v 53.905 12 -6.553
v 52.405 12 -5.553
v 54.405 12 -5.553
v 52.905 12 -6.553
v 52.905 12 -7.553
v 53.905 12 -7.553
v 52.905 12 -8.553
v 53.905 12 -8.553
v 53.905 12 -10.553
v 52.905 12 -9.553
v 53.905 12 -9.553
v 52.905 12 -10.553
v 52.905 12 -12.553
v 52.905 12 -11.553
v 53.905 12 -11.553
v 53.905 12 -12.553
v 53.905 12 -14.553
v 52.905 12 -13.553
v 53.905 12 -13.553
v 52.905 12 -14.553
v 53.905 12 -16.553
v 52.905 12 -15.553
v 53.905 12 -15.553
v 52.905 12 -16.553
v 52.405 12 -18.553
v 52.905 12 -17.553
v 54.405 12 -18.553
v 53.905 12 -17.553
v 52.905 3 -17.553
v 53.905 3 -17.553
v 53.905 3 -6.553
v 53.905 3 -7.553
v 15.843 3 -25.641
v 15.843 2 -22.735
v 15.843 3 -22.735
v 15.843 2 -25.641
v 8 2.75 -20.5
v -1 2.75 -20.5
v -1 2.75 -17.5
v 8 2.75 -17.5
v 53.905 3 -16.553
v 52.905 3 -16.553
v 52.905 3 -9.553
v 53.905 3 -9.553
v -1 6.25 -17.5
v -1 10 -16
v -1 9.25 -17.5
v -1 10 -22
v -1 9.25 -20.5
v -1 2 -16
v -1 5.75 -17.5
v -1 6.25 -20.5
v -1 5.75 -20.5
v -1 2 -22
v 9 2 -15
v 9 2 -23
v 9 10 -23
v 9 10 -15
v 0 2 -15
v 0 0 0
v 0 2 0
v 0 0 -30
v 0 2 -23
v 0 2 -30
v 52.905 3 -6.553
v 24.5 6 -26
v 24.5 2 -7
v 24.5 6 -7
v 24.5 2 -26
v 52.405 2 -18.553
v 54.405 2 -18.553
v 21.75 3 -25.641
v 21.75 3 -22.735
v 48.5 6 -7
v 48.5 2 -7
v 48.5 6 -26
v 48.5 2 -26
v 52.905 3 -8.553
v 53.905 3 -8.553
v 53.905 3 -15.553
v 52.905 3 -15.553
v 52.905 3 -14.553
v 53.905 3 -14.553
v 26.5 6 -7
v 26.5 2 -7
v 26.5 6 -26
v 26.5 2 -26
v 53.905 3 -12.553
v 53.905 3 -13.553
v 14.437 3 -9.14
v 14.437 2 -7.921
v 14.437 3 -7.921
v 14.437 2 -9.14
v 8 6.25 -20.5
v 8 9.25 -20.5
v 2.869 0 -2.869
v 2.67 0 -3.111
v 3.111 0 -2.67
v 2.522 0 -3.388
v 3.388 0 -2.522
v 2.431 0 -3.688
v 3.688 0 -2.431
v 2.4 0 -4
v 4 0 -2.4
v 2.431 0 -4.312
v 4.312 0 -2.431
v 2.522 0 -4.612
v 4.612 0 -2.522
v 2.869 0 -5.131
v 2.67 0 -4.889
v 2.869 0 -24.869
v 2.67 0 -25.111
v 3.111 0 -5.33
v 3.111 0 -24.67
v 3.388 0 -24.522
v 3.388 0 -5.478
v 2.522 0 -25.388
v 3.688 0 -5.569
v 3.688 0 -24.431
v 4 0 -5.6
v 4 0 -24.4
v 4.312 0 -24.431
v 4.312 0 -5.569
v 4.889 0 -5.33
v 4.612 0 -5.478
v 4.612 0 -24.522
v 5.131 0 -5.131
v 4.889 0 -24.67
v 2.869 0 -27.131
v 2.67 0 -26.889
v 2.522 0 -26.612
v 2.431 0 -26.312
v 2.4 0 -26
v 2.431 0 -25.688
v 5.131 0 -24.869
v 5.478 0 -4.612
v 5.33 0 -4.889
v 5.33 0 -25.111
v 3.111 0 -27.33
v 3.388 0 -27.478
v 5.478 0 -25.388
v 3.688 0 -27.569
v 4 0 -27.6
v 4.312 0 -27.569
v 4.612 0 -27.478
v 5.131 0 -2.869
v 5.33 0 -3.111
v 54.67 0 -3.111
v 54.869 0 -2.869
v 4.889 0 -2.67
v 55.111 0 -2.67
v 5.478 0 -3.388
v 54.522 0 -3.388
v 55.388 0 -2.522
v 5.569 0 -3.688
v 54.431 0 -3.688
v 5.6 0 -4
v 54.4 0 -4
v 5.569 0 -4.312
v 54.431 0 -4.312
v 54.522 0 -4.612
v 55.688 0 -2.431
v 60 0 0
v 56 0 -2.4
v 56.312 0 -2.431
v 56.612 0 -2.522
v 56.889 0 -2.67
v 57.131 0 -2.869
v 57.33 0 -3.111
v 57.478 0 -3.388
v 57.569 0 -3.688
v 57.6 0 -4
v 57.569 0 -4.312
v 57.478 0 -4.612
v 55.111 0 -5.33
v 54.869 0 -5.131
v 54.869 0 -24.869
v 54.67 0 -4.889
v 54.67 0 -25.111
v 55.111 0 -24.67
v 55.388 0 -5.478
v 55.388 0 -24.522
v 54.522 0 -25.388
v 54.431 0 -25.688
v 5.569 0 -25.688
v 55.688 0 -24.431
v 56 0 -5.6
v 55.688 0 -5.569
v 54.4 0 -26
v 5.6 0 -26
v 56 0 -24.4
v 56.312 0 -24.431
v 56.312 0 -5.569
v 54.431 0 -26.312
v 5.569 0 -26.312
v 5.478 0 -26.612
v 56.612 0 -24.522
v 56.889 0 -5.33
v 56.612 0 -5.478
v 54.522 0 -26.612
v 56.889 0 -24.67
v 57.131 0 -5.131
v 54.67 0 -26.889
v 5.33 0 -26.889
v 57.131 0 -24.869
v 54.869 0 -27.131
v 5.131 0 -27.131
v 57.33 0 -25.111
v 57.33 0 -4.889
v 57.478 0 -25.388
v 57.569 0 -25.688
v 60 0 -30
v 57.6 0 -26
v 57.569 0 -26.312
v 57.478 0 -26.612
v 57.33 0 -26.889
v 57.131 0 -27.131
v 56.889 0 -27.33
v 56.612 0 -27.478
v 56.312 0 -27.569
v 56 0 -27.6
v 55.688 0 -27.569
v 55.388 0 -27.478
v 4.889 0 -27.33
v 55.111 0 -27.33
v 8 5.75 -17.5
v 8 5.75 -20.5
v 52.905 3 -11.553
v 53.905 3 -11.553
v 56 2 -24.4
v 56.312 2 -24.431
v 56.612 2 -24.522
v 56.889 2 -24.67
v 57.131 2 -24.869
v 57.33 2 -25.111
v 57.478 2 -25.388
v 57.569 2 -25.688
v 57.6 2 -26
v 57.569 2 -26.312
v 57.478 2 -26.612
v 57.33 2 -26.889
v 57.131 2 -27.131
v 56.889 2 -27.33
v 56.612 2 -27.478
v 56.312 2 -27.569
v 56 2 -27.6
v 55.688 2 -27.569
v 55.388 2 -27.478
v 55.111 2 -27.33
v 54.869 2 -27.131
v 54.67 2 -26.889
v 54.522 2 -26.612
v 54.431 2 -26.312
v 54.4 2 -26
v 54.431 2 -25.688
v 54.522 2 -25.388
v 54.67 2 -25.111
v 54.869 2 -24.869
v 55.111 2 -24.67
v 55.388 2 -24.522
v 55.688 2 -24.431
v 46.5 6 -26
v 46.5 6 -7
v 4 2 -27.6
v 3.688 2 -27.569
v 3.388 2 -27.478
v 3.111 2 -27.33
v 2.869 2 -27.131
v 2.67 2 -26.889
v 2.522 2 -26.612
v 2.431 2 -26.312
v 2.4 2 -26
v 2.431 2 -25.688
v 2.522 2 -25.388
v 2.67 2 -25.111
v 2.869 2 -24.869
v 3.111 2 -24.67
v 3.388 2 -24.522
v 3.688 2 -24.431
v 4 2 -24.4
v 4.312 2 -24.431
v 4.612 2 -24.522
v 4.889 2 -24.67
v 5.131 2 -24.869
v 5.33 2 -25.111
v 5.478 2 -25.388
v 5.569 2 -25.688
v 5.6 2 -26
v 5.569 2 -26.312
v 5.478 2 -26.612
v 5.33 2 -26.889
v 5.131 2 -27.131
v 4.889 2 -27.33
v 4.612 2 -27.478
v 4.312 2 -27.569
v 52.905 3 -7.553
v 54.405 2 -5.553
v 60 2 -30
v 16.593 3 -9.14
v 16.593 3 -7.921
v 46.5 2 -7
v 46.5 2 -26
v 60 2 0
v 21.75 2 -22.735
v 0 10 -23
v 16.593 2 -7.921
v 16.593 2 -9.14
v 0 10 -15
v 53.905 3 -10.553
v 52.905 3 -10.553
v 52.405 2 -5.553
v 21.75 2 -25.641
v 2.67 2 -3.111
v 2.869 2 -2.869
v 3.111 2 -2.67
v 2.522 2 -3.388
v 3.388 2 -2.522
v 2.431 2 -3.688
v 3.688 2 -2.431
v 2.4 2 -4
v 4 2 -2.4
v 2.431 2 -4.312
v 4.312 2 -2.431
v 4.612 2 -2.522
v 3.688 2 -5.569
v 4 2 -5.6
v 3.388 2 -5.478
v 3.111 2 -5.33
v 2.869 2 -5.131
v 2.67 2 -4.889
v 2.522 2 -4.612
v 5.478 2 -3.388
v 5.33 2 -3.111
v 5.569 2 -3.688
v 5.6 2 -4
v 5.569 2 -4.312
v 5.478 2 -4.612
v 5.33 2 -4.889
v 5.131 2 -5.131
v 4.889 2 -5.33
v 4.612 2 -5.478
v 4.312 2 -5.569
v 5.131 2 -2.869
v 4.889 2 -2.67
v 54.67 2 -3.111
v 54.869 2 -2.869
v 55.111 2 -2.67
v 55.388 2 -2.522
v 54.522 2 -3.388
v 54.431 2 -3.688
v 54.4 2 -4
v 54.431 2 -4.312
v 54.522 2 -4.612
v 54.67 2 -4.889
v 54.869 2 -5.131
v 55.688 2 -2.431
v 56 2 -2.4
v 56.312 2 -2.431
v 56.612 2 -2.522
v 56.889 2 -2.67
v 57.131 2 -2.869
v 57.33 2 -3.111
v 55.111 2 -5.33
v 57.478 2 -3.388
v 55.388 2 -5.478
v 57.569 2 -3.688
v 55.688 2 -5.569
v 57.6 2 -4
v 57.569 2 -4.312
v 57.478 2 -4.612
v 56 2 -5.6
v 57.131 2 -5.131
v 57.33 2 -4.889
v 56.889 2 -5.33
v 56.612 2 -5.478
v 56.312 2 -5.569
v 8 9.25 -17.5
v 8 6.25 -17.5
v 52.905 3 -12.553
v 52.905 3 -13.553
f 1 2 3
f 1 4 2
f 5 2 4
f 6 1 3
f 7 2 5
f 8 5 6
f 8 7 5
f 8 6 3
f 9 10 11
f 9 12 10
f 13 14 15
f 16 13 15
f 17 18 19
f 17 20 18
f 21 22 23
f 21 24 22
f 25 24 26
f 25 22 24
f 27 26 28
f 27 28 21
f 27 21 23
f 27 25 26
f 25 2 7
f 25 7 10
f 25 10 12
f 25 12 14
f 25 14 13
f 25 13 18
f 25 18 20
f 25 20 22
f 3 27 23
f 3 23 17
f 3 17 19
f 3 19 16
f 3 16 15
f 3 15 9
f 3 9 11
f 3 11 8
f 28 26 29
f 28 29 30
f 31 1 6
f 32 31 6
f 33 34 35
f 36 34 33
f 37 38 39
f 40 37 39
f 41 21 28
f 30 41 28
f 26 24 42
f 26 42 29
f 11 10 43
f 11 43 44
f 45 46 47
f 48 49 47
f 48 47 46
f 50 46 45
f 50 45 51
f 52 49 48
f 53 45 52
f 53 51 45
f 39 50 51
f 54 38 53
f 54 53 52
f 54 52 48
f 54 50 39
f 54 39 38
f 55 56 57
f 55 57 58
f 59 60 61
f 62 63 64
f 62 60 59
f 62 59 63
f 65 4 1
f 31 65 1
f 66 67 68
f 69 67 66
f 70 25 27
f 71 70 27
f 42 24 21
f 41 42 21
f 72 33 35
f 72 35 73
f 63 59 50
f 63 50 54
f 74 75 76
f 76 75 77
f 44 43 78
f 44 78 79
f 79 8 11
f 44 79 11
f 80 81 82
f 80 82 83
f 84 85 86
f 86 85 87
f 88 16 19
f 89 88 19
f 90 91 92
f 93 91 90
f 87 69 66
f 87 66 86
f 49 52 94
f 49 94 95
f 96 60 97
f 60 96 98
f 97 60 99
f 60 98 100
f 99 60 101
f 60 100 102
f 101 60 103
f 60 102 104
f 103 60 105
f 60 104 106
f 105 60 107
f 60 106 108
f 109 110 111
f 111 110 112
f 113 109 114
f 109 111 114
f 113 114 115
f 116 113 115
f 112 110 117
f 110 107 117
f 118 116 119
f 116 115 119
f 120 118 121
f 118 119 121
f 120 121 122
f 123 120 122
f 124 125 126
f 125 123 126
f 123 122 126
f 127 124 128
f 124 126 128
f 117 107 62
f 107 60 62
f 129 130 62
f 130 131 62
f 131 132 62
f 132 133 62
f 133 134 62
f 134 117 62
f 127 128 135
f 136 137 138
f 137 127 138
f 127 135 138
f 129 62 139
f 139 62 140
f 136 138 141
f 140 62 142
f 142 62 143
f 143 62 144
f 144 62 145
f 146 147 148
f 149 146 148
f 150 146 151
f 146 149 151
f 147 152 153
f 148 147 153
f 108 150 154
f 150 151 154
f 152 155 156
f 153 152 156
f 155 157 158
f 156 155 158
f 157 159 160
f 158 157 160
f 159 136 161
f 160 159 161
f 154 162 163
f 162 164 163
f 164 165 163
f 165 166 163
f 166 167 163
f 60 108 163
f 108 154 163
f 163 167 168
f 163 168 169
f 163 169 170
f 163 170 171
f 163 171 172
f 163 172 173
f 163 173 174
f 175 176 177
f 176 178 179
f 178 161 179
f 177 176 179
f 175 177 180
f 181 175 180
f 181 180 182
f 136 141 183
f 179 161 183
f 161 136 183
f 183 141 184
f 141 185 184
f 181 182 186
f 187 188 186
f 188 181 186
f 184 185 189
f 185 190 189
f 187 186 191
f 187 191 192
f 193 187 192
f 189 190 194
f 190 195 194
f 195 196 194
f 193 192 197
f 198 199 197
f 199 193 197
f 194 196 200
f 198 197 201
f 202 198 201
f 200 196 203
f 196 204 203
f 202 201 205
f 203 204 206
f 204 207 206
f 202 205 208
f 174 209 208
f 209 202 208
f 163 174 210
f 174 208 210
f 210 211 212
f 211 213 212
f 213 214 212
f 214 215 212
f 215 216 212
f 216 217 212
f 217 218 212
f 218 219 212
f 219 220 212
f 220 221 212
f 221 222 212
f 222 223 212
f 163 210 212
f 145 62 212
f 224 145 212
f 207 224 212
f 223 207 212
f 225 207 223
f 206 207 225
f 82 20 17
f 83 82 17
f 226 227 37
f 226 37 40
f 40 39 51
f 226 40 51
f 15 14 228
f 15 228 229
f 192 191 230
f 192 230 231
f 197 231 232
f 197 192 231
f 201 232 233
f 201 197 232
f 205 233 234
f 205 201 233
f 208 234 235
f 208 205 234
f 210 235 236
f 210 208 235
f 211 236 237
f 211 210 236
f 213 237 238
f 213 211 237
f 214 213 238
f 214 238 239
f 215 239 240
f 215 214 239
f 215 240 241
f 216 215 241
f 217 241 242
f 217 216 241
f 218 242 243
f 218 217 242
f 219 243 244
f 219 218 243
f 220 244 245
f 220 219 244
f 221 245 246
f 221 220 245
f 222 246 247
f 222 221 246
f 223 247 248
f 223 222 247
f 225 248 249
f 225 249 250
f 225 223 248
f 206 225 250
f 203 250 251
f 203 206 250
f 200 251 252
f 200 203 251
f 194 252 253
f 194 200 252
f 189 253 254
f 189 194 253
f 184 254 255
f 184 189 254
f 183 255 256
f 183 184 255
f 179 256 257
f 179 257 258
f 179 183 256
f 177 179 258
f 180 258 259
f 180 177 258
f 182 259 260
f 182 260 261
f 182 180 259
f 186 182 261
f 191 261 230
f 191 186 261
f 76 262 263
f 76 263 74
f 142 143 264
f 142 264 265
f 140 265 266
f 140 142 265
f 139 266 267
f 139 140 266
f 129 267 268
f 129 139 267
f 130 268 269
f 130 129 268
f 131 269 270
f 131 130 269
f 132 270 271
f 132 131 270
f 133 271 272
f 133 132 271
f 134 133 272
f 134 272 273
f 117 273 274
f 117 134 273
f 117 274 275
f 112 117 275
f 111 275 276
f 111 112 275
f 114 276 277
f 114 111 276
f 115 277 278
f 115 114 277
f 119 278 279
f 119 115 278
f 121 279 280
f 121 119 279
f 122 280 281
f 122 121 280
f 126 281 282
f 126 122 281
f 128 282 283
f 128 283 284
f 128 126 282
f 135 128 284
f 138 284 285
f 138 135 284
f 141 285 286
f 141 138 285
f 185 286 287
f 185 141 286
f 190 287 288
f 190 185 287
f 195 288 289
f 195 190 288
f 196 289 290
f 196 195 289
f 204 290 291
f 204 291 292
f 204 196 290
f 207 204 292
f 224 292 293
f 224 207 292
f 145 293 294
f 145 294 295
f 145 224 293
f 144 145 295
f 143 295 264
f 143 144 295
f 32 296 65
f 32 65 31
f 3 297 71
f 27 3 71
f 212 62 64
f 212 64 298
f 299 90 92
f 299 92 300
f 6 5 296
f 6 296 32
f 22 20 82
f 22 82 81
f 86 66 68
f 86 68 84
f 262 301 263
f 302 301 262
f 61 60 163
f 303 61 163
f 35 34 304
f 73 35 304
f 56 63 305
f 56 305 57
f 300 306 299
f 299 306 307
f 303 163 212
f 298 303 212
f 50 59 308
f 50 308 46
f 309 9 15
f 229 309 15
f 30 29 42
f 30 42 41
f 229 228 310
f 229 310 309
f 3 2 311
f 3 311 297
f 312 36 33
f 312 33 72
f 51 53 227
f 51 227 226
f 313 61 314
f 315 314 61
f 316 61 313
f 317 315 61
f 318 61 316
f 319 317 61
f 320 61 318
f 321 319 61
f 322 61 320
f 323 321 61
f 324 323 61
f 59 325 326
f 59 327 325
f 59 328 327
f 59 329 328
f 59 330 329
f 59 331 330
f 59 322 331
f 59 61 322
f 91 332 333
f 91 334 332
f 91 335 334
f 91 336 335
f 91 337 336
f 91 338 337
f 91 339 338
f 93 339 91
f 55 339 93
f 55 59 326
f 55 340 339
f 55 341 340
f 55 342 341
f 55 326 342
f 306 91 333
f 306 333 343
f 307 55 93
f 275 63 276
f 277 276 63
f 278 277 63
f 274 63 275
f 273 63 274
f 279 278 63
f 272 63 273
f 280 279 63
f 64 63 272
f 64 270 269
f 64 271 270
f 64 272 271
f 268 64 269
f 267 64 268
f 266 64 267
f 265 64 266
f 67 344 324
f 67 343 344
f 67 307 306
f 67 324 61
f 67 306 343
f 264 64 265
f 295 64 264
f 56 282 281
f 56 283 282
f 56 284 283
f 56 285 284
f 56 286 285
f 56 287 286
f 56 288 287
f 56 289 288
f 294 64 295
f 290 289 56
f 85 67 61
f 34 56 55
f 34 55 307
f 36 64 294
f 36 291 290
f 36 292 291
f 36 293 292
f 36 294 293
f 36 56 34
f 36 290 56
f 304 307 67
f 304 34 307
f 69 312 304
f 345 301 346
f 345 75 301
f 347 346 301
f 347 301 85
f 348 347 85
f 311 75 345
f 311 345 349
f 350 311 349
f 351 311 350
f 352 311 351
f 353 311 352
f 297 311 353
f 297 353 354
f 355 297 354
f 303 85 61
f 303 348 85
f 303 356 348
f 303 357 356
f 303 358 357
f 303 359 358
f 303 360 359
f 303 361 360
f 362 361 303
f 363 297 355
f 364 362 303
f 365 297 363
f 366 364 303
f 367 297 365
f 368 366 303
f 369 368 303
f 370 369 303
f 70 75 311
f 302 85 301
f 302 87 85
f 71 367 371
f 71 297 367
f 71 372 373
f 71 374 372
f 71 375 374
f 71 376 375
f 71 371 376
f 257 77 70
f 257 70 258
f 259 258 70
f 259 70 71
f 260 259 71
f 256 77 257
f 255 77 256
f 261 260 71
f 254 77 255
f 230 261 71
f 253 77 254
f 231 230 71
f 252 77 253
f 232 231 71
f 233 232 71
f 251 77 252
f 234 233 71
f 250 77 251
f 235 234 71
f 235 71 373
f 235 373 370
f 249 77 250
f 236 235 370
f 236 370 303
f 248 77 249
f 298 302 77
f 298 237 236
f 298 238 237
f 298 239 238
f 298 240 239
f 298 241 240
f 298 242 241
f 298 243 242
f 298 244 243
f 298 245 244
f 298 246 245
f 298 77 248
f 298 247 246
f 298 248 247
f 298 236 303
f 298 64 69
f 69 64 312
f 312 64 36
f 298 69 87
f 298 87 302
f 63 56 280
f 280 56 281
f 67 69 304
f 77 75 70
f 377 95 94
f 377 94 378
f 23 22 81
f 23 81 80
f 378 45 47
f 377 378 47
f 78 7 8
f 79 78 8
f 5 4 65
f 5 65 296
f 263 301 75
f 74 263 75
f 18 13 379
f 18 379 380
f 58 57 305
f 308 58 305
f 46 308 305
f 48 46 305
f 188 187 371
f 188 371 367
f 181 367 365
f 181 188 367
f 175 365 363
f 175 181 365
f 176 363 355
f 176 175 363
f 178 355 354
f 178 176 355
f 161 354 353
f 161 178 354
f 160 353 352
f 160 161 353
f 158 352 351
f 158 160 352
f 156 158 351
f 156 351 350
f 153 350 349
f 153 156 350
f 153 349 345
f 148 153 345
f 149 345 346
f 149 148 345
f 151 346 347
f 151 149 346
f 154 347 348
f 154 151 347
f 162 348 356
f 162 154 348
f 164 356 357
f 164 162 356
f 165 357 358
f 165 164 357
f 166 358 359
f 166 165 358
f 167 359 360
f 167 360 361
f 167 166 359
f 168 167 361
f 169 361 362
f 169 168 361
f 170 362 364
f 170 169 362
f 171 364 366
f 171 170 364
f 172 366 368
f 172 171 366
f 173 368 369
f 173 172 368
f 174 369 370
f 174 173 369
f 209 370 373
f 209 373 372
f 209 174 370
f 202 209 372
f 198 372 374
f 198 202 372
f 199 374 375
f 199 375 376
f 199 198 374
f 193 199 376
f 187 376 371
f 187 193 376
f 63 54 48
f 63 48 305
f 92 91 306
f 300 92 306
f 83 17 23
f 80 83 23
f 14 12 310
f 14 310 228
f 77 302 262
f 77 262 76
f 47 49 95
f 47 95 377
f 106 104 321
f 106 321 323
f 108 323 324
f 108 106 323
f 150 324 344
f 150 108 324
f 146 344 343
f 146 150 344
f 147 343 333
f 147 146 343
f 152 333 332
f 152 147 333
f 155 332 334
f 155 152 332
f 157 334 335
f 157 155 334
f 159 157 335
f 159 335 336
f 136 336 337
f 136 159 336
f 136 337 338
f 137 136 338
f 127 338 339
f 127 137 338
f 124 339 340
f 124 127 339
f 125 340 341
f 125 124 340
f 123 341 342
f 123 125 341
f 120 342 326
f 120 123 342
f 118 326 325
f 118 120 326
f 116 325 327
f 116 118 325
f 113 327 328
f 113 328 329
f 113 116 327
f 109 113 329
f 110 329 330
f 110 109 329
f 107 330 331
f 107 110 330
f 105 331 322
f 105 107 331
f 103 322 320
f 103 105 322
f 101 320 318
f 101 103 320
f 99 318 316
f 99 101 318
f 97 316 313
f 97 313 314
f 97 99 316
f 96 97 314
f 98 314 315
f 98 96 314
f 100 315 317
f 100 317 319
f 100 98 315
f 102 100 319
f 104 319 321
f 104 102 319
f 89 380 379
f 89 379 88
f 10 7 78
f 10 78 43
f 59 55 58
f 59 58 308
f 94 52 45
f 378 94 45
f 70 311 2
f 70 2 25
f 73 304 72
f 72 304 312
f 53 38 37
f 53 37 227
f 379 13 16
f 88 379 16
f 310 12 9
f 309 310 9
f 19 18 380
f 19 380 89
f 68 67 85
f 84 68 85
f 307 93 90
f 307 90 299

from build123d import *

# Parameters (mm, degrees)
SKETCH1_W           = 60
SKETCH1_H           = 30
SKETCH1_R           = 1.6
BOSS_EXTRUDE1_DEPTH = 2
SKETCH2_W           = 2
SKETCH2_H           = 19
BOSS_EXTRUDE2_DEPTH = 4
SKETCH3_W           = 2
SKETCH3_H           = 13
BOSS_EXTRUDE3_DEPTH = 10
SKETCH4_W           = 5.906565556
SKETCH4_H           = 2.906405273
SKETCH4_W_2         = 2.156365203
SKETCH4_H_2         = 1.218815115
BOSS_EXTRUDE4_DEPTH = 1
BOSS_EXTRUDE5_DEPTH = 8
SKETCH7_W           = 3
SKETCH7_H           = 3
CUT_EXTRUDE1_DEPTH  = 9
SKETCH9_W           = 1
SKETCH9_H           = 1
CUT_EXTRUDE2_DEPTH  = 9


with BuildPart() as part:
    # Sketch1 → Boss-Extrude1 (new body)
    with BuildSketch(Plane(origin=(0, 0, 0), x_dir=(1, 0, 0), z_dir=(0, 1, 0))):
        with Locations((30, 15)):
            Rectangle(SKETCH1_W, SKETCH1_H)
        with Locations(Location((4, 4, 0), (0, 0, 270))):
            Circle(SKETCH1_R, mode=Mode.SUBTRACT)
        with Locations(Location((4, 26, 0), (0, 0, 90))):
            Circle(SKETCH1_R, mode=Mode.SUBTRACT)
        with Locations(Location((56, 26, 0), (0, 0, 270))):
            Circle(SKETCH1_R, mode=Mode.SUBTRACT)
        with Locations(Location((56, 4, 0), (0, 0, 90))):
            Circle(SKETCH1_R, mode=Mode.SUBTRACT)
    extrude(amount=BOSS_EXTRUDE1_DEPTH)

    # Sketch2 → Boss-Extrude2 (add)
    with BuildSketch(Plane(origin=(0, 2, 0), x_dir=(1, 0, 0), z_dir=(0, 1, 0))):
        with Locations((25.5, 16.5)):
            Rectangle(SKETCH2_W, SKETCH2_H)
        with Locations((47.5, 16.5)):
            Rectangle(SKETCH2_W, SKETCH2_H)
    extrude(amount=BOSS_EXTRUDE2_DEPTH)

    # Sketch3 → Boss-Extrude3 (add)
    with BuildSketch(Plane(origin=(0, 2, 0), x_dir=(1, 0, 0), z_dir=(0, 1, 0))):
        with Locations((53.405190381, 12.053258952)):
            Rectangle(SKETCH3_W, SKETCH3_H)
    extrude(amount=BOSS_EXTRUDE3_DEPTH)

    # Sketch4 → Boss-Extrude4 (add)
    with BuildSketch(Plane(origin=(0, 2, 0), x_dir=(1, 0, 0), z_dir=(0, 1, 0))):
        with Locations((18.796276446, 24.187990865)):
            Rectangle(SKETCH4_W, SKETCH4_H)
        with Locations((15.514851138, 8.530904392)):
            Rectangle(SKETCH4_W_2, SKETCH4_H_2)
    extrude(amount=BOSS_EXTRUDE4_DEPTH)

    # Sketch6 → Boss-Extrude5 (add)
    with BuildSketch(Plane(origin=(0, 2, 0), x_dir=(1, 0, 0), z_dir=(0, 1, 0))):
        Polygon((9, 23), (9, 15), (0, 15), (-1, 16), (-1, 22), (0, 23), align=None)
    extrude(amount=BOSS_EXTRUDE5_DEPTH)

    # Sketch7 → Cut-Extrude1 (cut)
    with BuildSketch(Plane.ZY.offset(1)):
        with Locations((-19, 7.75)):
            Rectangle(SKETCH7_W, SKETCH7_H)
        with Locations((-19, 4.25)):
            Rectangle(SKETCH7_W, SKETCH7_H)
    extrude(amount=-CUT_EXTRUDE1_DEPTH, mode=Mode.SUBTRACT)

    # Sketch9 → Cut-Extrude2 (cut)
    with BuildSketch(Plane(origin=(0, 12, 0), x_dir=(1, 0, 0), z_dir=(0, 1, 0))):
        with Locations((53.405190381, 13.053258952)):
            Rectangle(SKETCH9_W, SKETCH9_H)
        with Locations((53.405190381, 17.053258952)):
            Rectangle(SKETCH9_W, SKETCH9_H)
        with Locations((53.405190381, 15.053258952)):
            Rectangle(SKETCH9_W, SKETCH9_H)
        with Locations((53.405190381, 11.053258952)):
            Rectangle(SKETCH9_W, SKETCH9_H)
        with Locations((53.405190381, 9.053258952)):
            Rectangle(SKETCH9_W, SKETCH9_H)
        with Locations((53.405190381, 7.053258952)):
            Rectangle(SKETCH9_W, SKETCH9_H)
    extrude(amount=-CUT_EXTRUDE2_DEPTH, mode=Mode.SUBTRACT)


solid = part.part
